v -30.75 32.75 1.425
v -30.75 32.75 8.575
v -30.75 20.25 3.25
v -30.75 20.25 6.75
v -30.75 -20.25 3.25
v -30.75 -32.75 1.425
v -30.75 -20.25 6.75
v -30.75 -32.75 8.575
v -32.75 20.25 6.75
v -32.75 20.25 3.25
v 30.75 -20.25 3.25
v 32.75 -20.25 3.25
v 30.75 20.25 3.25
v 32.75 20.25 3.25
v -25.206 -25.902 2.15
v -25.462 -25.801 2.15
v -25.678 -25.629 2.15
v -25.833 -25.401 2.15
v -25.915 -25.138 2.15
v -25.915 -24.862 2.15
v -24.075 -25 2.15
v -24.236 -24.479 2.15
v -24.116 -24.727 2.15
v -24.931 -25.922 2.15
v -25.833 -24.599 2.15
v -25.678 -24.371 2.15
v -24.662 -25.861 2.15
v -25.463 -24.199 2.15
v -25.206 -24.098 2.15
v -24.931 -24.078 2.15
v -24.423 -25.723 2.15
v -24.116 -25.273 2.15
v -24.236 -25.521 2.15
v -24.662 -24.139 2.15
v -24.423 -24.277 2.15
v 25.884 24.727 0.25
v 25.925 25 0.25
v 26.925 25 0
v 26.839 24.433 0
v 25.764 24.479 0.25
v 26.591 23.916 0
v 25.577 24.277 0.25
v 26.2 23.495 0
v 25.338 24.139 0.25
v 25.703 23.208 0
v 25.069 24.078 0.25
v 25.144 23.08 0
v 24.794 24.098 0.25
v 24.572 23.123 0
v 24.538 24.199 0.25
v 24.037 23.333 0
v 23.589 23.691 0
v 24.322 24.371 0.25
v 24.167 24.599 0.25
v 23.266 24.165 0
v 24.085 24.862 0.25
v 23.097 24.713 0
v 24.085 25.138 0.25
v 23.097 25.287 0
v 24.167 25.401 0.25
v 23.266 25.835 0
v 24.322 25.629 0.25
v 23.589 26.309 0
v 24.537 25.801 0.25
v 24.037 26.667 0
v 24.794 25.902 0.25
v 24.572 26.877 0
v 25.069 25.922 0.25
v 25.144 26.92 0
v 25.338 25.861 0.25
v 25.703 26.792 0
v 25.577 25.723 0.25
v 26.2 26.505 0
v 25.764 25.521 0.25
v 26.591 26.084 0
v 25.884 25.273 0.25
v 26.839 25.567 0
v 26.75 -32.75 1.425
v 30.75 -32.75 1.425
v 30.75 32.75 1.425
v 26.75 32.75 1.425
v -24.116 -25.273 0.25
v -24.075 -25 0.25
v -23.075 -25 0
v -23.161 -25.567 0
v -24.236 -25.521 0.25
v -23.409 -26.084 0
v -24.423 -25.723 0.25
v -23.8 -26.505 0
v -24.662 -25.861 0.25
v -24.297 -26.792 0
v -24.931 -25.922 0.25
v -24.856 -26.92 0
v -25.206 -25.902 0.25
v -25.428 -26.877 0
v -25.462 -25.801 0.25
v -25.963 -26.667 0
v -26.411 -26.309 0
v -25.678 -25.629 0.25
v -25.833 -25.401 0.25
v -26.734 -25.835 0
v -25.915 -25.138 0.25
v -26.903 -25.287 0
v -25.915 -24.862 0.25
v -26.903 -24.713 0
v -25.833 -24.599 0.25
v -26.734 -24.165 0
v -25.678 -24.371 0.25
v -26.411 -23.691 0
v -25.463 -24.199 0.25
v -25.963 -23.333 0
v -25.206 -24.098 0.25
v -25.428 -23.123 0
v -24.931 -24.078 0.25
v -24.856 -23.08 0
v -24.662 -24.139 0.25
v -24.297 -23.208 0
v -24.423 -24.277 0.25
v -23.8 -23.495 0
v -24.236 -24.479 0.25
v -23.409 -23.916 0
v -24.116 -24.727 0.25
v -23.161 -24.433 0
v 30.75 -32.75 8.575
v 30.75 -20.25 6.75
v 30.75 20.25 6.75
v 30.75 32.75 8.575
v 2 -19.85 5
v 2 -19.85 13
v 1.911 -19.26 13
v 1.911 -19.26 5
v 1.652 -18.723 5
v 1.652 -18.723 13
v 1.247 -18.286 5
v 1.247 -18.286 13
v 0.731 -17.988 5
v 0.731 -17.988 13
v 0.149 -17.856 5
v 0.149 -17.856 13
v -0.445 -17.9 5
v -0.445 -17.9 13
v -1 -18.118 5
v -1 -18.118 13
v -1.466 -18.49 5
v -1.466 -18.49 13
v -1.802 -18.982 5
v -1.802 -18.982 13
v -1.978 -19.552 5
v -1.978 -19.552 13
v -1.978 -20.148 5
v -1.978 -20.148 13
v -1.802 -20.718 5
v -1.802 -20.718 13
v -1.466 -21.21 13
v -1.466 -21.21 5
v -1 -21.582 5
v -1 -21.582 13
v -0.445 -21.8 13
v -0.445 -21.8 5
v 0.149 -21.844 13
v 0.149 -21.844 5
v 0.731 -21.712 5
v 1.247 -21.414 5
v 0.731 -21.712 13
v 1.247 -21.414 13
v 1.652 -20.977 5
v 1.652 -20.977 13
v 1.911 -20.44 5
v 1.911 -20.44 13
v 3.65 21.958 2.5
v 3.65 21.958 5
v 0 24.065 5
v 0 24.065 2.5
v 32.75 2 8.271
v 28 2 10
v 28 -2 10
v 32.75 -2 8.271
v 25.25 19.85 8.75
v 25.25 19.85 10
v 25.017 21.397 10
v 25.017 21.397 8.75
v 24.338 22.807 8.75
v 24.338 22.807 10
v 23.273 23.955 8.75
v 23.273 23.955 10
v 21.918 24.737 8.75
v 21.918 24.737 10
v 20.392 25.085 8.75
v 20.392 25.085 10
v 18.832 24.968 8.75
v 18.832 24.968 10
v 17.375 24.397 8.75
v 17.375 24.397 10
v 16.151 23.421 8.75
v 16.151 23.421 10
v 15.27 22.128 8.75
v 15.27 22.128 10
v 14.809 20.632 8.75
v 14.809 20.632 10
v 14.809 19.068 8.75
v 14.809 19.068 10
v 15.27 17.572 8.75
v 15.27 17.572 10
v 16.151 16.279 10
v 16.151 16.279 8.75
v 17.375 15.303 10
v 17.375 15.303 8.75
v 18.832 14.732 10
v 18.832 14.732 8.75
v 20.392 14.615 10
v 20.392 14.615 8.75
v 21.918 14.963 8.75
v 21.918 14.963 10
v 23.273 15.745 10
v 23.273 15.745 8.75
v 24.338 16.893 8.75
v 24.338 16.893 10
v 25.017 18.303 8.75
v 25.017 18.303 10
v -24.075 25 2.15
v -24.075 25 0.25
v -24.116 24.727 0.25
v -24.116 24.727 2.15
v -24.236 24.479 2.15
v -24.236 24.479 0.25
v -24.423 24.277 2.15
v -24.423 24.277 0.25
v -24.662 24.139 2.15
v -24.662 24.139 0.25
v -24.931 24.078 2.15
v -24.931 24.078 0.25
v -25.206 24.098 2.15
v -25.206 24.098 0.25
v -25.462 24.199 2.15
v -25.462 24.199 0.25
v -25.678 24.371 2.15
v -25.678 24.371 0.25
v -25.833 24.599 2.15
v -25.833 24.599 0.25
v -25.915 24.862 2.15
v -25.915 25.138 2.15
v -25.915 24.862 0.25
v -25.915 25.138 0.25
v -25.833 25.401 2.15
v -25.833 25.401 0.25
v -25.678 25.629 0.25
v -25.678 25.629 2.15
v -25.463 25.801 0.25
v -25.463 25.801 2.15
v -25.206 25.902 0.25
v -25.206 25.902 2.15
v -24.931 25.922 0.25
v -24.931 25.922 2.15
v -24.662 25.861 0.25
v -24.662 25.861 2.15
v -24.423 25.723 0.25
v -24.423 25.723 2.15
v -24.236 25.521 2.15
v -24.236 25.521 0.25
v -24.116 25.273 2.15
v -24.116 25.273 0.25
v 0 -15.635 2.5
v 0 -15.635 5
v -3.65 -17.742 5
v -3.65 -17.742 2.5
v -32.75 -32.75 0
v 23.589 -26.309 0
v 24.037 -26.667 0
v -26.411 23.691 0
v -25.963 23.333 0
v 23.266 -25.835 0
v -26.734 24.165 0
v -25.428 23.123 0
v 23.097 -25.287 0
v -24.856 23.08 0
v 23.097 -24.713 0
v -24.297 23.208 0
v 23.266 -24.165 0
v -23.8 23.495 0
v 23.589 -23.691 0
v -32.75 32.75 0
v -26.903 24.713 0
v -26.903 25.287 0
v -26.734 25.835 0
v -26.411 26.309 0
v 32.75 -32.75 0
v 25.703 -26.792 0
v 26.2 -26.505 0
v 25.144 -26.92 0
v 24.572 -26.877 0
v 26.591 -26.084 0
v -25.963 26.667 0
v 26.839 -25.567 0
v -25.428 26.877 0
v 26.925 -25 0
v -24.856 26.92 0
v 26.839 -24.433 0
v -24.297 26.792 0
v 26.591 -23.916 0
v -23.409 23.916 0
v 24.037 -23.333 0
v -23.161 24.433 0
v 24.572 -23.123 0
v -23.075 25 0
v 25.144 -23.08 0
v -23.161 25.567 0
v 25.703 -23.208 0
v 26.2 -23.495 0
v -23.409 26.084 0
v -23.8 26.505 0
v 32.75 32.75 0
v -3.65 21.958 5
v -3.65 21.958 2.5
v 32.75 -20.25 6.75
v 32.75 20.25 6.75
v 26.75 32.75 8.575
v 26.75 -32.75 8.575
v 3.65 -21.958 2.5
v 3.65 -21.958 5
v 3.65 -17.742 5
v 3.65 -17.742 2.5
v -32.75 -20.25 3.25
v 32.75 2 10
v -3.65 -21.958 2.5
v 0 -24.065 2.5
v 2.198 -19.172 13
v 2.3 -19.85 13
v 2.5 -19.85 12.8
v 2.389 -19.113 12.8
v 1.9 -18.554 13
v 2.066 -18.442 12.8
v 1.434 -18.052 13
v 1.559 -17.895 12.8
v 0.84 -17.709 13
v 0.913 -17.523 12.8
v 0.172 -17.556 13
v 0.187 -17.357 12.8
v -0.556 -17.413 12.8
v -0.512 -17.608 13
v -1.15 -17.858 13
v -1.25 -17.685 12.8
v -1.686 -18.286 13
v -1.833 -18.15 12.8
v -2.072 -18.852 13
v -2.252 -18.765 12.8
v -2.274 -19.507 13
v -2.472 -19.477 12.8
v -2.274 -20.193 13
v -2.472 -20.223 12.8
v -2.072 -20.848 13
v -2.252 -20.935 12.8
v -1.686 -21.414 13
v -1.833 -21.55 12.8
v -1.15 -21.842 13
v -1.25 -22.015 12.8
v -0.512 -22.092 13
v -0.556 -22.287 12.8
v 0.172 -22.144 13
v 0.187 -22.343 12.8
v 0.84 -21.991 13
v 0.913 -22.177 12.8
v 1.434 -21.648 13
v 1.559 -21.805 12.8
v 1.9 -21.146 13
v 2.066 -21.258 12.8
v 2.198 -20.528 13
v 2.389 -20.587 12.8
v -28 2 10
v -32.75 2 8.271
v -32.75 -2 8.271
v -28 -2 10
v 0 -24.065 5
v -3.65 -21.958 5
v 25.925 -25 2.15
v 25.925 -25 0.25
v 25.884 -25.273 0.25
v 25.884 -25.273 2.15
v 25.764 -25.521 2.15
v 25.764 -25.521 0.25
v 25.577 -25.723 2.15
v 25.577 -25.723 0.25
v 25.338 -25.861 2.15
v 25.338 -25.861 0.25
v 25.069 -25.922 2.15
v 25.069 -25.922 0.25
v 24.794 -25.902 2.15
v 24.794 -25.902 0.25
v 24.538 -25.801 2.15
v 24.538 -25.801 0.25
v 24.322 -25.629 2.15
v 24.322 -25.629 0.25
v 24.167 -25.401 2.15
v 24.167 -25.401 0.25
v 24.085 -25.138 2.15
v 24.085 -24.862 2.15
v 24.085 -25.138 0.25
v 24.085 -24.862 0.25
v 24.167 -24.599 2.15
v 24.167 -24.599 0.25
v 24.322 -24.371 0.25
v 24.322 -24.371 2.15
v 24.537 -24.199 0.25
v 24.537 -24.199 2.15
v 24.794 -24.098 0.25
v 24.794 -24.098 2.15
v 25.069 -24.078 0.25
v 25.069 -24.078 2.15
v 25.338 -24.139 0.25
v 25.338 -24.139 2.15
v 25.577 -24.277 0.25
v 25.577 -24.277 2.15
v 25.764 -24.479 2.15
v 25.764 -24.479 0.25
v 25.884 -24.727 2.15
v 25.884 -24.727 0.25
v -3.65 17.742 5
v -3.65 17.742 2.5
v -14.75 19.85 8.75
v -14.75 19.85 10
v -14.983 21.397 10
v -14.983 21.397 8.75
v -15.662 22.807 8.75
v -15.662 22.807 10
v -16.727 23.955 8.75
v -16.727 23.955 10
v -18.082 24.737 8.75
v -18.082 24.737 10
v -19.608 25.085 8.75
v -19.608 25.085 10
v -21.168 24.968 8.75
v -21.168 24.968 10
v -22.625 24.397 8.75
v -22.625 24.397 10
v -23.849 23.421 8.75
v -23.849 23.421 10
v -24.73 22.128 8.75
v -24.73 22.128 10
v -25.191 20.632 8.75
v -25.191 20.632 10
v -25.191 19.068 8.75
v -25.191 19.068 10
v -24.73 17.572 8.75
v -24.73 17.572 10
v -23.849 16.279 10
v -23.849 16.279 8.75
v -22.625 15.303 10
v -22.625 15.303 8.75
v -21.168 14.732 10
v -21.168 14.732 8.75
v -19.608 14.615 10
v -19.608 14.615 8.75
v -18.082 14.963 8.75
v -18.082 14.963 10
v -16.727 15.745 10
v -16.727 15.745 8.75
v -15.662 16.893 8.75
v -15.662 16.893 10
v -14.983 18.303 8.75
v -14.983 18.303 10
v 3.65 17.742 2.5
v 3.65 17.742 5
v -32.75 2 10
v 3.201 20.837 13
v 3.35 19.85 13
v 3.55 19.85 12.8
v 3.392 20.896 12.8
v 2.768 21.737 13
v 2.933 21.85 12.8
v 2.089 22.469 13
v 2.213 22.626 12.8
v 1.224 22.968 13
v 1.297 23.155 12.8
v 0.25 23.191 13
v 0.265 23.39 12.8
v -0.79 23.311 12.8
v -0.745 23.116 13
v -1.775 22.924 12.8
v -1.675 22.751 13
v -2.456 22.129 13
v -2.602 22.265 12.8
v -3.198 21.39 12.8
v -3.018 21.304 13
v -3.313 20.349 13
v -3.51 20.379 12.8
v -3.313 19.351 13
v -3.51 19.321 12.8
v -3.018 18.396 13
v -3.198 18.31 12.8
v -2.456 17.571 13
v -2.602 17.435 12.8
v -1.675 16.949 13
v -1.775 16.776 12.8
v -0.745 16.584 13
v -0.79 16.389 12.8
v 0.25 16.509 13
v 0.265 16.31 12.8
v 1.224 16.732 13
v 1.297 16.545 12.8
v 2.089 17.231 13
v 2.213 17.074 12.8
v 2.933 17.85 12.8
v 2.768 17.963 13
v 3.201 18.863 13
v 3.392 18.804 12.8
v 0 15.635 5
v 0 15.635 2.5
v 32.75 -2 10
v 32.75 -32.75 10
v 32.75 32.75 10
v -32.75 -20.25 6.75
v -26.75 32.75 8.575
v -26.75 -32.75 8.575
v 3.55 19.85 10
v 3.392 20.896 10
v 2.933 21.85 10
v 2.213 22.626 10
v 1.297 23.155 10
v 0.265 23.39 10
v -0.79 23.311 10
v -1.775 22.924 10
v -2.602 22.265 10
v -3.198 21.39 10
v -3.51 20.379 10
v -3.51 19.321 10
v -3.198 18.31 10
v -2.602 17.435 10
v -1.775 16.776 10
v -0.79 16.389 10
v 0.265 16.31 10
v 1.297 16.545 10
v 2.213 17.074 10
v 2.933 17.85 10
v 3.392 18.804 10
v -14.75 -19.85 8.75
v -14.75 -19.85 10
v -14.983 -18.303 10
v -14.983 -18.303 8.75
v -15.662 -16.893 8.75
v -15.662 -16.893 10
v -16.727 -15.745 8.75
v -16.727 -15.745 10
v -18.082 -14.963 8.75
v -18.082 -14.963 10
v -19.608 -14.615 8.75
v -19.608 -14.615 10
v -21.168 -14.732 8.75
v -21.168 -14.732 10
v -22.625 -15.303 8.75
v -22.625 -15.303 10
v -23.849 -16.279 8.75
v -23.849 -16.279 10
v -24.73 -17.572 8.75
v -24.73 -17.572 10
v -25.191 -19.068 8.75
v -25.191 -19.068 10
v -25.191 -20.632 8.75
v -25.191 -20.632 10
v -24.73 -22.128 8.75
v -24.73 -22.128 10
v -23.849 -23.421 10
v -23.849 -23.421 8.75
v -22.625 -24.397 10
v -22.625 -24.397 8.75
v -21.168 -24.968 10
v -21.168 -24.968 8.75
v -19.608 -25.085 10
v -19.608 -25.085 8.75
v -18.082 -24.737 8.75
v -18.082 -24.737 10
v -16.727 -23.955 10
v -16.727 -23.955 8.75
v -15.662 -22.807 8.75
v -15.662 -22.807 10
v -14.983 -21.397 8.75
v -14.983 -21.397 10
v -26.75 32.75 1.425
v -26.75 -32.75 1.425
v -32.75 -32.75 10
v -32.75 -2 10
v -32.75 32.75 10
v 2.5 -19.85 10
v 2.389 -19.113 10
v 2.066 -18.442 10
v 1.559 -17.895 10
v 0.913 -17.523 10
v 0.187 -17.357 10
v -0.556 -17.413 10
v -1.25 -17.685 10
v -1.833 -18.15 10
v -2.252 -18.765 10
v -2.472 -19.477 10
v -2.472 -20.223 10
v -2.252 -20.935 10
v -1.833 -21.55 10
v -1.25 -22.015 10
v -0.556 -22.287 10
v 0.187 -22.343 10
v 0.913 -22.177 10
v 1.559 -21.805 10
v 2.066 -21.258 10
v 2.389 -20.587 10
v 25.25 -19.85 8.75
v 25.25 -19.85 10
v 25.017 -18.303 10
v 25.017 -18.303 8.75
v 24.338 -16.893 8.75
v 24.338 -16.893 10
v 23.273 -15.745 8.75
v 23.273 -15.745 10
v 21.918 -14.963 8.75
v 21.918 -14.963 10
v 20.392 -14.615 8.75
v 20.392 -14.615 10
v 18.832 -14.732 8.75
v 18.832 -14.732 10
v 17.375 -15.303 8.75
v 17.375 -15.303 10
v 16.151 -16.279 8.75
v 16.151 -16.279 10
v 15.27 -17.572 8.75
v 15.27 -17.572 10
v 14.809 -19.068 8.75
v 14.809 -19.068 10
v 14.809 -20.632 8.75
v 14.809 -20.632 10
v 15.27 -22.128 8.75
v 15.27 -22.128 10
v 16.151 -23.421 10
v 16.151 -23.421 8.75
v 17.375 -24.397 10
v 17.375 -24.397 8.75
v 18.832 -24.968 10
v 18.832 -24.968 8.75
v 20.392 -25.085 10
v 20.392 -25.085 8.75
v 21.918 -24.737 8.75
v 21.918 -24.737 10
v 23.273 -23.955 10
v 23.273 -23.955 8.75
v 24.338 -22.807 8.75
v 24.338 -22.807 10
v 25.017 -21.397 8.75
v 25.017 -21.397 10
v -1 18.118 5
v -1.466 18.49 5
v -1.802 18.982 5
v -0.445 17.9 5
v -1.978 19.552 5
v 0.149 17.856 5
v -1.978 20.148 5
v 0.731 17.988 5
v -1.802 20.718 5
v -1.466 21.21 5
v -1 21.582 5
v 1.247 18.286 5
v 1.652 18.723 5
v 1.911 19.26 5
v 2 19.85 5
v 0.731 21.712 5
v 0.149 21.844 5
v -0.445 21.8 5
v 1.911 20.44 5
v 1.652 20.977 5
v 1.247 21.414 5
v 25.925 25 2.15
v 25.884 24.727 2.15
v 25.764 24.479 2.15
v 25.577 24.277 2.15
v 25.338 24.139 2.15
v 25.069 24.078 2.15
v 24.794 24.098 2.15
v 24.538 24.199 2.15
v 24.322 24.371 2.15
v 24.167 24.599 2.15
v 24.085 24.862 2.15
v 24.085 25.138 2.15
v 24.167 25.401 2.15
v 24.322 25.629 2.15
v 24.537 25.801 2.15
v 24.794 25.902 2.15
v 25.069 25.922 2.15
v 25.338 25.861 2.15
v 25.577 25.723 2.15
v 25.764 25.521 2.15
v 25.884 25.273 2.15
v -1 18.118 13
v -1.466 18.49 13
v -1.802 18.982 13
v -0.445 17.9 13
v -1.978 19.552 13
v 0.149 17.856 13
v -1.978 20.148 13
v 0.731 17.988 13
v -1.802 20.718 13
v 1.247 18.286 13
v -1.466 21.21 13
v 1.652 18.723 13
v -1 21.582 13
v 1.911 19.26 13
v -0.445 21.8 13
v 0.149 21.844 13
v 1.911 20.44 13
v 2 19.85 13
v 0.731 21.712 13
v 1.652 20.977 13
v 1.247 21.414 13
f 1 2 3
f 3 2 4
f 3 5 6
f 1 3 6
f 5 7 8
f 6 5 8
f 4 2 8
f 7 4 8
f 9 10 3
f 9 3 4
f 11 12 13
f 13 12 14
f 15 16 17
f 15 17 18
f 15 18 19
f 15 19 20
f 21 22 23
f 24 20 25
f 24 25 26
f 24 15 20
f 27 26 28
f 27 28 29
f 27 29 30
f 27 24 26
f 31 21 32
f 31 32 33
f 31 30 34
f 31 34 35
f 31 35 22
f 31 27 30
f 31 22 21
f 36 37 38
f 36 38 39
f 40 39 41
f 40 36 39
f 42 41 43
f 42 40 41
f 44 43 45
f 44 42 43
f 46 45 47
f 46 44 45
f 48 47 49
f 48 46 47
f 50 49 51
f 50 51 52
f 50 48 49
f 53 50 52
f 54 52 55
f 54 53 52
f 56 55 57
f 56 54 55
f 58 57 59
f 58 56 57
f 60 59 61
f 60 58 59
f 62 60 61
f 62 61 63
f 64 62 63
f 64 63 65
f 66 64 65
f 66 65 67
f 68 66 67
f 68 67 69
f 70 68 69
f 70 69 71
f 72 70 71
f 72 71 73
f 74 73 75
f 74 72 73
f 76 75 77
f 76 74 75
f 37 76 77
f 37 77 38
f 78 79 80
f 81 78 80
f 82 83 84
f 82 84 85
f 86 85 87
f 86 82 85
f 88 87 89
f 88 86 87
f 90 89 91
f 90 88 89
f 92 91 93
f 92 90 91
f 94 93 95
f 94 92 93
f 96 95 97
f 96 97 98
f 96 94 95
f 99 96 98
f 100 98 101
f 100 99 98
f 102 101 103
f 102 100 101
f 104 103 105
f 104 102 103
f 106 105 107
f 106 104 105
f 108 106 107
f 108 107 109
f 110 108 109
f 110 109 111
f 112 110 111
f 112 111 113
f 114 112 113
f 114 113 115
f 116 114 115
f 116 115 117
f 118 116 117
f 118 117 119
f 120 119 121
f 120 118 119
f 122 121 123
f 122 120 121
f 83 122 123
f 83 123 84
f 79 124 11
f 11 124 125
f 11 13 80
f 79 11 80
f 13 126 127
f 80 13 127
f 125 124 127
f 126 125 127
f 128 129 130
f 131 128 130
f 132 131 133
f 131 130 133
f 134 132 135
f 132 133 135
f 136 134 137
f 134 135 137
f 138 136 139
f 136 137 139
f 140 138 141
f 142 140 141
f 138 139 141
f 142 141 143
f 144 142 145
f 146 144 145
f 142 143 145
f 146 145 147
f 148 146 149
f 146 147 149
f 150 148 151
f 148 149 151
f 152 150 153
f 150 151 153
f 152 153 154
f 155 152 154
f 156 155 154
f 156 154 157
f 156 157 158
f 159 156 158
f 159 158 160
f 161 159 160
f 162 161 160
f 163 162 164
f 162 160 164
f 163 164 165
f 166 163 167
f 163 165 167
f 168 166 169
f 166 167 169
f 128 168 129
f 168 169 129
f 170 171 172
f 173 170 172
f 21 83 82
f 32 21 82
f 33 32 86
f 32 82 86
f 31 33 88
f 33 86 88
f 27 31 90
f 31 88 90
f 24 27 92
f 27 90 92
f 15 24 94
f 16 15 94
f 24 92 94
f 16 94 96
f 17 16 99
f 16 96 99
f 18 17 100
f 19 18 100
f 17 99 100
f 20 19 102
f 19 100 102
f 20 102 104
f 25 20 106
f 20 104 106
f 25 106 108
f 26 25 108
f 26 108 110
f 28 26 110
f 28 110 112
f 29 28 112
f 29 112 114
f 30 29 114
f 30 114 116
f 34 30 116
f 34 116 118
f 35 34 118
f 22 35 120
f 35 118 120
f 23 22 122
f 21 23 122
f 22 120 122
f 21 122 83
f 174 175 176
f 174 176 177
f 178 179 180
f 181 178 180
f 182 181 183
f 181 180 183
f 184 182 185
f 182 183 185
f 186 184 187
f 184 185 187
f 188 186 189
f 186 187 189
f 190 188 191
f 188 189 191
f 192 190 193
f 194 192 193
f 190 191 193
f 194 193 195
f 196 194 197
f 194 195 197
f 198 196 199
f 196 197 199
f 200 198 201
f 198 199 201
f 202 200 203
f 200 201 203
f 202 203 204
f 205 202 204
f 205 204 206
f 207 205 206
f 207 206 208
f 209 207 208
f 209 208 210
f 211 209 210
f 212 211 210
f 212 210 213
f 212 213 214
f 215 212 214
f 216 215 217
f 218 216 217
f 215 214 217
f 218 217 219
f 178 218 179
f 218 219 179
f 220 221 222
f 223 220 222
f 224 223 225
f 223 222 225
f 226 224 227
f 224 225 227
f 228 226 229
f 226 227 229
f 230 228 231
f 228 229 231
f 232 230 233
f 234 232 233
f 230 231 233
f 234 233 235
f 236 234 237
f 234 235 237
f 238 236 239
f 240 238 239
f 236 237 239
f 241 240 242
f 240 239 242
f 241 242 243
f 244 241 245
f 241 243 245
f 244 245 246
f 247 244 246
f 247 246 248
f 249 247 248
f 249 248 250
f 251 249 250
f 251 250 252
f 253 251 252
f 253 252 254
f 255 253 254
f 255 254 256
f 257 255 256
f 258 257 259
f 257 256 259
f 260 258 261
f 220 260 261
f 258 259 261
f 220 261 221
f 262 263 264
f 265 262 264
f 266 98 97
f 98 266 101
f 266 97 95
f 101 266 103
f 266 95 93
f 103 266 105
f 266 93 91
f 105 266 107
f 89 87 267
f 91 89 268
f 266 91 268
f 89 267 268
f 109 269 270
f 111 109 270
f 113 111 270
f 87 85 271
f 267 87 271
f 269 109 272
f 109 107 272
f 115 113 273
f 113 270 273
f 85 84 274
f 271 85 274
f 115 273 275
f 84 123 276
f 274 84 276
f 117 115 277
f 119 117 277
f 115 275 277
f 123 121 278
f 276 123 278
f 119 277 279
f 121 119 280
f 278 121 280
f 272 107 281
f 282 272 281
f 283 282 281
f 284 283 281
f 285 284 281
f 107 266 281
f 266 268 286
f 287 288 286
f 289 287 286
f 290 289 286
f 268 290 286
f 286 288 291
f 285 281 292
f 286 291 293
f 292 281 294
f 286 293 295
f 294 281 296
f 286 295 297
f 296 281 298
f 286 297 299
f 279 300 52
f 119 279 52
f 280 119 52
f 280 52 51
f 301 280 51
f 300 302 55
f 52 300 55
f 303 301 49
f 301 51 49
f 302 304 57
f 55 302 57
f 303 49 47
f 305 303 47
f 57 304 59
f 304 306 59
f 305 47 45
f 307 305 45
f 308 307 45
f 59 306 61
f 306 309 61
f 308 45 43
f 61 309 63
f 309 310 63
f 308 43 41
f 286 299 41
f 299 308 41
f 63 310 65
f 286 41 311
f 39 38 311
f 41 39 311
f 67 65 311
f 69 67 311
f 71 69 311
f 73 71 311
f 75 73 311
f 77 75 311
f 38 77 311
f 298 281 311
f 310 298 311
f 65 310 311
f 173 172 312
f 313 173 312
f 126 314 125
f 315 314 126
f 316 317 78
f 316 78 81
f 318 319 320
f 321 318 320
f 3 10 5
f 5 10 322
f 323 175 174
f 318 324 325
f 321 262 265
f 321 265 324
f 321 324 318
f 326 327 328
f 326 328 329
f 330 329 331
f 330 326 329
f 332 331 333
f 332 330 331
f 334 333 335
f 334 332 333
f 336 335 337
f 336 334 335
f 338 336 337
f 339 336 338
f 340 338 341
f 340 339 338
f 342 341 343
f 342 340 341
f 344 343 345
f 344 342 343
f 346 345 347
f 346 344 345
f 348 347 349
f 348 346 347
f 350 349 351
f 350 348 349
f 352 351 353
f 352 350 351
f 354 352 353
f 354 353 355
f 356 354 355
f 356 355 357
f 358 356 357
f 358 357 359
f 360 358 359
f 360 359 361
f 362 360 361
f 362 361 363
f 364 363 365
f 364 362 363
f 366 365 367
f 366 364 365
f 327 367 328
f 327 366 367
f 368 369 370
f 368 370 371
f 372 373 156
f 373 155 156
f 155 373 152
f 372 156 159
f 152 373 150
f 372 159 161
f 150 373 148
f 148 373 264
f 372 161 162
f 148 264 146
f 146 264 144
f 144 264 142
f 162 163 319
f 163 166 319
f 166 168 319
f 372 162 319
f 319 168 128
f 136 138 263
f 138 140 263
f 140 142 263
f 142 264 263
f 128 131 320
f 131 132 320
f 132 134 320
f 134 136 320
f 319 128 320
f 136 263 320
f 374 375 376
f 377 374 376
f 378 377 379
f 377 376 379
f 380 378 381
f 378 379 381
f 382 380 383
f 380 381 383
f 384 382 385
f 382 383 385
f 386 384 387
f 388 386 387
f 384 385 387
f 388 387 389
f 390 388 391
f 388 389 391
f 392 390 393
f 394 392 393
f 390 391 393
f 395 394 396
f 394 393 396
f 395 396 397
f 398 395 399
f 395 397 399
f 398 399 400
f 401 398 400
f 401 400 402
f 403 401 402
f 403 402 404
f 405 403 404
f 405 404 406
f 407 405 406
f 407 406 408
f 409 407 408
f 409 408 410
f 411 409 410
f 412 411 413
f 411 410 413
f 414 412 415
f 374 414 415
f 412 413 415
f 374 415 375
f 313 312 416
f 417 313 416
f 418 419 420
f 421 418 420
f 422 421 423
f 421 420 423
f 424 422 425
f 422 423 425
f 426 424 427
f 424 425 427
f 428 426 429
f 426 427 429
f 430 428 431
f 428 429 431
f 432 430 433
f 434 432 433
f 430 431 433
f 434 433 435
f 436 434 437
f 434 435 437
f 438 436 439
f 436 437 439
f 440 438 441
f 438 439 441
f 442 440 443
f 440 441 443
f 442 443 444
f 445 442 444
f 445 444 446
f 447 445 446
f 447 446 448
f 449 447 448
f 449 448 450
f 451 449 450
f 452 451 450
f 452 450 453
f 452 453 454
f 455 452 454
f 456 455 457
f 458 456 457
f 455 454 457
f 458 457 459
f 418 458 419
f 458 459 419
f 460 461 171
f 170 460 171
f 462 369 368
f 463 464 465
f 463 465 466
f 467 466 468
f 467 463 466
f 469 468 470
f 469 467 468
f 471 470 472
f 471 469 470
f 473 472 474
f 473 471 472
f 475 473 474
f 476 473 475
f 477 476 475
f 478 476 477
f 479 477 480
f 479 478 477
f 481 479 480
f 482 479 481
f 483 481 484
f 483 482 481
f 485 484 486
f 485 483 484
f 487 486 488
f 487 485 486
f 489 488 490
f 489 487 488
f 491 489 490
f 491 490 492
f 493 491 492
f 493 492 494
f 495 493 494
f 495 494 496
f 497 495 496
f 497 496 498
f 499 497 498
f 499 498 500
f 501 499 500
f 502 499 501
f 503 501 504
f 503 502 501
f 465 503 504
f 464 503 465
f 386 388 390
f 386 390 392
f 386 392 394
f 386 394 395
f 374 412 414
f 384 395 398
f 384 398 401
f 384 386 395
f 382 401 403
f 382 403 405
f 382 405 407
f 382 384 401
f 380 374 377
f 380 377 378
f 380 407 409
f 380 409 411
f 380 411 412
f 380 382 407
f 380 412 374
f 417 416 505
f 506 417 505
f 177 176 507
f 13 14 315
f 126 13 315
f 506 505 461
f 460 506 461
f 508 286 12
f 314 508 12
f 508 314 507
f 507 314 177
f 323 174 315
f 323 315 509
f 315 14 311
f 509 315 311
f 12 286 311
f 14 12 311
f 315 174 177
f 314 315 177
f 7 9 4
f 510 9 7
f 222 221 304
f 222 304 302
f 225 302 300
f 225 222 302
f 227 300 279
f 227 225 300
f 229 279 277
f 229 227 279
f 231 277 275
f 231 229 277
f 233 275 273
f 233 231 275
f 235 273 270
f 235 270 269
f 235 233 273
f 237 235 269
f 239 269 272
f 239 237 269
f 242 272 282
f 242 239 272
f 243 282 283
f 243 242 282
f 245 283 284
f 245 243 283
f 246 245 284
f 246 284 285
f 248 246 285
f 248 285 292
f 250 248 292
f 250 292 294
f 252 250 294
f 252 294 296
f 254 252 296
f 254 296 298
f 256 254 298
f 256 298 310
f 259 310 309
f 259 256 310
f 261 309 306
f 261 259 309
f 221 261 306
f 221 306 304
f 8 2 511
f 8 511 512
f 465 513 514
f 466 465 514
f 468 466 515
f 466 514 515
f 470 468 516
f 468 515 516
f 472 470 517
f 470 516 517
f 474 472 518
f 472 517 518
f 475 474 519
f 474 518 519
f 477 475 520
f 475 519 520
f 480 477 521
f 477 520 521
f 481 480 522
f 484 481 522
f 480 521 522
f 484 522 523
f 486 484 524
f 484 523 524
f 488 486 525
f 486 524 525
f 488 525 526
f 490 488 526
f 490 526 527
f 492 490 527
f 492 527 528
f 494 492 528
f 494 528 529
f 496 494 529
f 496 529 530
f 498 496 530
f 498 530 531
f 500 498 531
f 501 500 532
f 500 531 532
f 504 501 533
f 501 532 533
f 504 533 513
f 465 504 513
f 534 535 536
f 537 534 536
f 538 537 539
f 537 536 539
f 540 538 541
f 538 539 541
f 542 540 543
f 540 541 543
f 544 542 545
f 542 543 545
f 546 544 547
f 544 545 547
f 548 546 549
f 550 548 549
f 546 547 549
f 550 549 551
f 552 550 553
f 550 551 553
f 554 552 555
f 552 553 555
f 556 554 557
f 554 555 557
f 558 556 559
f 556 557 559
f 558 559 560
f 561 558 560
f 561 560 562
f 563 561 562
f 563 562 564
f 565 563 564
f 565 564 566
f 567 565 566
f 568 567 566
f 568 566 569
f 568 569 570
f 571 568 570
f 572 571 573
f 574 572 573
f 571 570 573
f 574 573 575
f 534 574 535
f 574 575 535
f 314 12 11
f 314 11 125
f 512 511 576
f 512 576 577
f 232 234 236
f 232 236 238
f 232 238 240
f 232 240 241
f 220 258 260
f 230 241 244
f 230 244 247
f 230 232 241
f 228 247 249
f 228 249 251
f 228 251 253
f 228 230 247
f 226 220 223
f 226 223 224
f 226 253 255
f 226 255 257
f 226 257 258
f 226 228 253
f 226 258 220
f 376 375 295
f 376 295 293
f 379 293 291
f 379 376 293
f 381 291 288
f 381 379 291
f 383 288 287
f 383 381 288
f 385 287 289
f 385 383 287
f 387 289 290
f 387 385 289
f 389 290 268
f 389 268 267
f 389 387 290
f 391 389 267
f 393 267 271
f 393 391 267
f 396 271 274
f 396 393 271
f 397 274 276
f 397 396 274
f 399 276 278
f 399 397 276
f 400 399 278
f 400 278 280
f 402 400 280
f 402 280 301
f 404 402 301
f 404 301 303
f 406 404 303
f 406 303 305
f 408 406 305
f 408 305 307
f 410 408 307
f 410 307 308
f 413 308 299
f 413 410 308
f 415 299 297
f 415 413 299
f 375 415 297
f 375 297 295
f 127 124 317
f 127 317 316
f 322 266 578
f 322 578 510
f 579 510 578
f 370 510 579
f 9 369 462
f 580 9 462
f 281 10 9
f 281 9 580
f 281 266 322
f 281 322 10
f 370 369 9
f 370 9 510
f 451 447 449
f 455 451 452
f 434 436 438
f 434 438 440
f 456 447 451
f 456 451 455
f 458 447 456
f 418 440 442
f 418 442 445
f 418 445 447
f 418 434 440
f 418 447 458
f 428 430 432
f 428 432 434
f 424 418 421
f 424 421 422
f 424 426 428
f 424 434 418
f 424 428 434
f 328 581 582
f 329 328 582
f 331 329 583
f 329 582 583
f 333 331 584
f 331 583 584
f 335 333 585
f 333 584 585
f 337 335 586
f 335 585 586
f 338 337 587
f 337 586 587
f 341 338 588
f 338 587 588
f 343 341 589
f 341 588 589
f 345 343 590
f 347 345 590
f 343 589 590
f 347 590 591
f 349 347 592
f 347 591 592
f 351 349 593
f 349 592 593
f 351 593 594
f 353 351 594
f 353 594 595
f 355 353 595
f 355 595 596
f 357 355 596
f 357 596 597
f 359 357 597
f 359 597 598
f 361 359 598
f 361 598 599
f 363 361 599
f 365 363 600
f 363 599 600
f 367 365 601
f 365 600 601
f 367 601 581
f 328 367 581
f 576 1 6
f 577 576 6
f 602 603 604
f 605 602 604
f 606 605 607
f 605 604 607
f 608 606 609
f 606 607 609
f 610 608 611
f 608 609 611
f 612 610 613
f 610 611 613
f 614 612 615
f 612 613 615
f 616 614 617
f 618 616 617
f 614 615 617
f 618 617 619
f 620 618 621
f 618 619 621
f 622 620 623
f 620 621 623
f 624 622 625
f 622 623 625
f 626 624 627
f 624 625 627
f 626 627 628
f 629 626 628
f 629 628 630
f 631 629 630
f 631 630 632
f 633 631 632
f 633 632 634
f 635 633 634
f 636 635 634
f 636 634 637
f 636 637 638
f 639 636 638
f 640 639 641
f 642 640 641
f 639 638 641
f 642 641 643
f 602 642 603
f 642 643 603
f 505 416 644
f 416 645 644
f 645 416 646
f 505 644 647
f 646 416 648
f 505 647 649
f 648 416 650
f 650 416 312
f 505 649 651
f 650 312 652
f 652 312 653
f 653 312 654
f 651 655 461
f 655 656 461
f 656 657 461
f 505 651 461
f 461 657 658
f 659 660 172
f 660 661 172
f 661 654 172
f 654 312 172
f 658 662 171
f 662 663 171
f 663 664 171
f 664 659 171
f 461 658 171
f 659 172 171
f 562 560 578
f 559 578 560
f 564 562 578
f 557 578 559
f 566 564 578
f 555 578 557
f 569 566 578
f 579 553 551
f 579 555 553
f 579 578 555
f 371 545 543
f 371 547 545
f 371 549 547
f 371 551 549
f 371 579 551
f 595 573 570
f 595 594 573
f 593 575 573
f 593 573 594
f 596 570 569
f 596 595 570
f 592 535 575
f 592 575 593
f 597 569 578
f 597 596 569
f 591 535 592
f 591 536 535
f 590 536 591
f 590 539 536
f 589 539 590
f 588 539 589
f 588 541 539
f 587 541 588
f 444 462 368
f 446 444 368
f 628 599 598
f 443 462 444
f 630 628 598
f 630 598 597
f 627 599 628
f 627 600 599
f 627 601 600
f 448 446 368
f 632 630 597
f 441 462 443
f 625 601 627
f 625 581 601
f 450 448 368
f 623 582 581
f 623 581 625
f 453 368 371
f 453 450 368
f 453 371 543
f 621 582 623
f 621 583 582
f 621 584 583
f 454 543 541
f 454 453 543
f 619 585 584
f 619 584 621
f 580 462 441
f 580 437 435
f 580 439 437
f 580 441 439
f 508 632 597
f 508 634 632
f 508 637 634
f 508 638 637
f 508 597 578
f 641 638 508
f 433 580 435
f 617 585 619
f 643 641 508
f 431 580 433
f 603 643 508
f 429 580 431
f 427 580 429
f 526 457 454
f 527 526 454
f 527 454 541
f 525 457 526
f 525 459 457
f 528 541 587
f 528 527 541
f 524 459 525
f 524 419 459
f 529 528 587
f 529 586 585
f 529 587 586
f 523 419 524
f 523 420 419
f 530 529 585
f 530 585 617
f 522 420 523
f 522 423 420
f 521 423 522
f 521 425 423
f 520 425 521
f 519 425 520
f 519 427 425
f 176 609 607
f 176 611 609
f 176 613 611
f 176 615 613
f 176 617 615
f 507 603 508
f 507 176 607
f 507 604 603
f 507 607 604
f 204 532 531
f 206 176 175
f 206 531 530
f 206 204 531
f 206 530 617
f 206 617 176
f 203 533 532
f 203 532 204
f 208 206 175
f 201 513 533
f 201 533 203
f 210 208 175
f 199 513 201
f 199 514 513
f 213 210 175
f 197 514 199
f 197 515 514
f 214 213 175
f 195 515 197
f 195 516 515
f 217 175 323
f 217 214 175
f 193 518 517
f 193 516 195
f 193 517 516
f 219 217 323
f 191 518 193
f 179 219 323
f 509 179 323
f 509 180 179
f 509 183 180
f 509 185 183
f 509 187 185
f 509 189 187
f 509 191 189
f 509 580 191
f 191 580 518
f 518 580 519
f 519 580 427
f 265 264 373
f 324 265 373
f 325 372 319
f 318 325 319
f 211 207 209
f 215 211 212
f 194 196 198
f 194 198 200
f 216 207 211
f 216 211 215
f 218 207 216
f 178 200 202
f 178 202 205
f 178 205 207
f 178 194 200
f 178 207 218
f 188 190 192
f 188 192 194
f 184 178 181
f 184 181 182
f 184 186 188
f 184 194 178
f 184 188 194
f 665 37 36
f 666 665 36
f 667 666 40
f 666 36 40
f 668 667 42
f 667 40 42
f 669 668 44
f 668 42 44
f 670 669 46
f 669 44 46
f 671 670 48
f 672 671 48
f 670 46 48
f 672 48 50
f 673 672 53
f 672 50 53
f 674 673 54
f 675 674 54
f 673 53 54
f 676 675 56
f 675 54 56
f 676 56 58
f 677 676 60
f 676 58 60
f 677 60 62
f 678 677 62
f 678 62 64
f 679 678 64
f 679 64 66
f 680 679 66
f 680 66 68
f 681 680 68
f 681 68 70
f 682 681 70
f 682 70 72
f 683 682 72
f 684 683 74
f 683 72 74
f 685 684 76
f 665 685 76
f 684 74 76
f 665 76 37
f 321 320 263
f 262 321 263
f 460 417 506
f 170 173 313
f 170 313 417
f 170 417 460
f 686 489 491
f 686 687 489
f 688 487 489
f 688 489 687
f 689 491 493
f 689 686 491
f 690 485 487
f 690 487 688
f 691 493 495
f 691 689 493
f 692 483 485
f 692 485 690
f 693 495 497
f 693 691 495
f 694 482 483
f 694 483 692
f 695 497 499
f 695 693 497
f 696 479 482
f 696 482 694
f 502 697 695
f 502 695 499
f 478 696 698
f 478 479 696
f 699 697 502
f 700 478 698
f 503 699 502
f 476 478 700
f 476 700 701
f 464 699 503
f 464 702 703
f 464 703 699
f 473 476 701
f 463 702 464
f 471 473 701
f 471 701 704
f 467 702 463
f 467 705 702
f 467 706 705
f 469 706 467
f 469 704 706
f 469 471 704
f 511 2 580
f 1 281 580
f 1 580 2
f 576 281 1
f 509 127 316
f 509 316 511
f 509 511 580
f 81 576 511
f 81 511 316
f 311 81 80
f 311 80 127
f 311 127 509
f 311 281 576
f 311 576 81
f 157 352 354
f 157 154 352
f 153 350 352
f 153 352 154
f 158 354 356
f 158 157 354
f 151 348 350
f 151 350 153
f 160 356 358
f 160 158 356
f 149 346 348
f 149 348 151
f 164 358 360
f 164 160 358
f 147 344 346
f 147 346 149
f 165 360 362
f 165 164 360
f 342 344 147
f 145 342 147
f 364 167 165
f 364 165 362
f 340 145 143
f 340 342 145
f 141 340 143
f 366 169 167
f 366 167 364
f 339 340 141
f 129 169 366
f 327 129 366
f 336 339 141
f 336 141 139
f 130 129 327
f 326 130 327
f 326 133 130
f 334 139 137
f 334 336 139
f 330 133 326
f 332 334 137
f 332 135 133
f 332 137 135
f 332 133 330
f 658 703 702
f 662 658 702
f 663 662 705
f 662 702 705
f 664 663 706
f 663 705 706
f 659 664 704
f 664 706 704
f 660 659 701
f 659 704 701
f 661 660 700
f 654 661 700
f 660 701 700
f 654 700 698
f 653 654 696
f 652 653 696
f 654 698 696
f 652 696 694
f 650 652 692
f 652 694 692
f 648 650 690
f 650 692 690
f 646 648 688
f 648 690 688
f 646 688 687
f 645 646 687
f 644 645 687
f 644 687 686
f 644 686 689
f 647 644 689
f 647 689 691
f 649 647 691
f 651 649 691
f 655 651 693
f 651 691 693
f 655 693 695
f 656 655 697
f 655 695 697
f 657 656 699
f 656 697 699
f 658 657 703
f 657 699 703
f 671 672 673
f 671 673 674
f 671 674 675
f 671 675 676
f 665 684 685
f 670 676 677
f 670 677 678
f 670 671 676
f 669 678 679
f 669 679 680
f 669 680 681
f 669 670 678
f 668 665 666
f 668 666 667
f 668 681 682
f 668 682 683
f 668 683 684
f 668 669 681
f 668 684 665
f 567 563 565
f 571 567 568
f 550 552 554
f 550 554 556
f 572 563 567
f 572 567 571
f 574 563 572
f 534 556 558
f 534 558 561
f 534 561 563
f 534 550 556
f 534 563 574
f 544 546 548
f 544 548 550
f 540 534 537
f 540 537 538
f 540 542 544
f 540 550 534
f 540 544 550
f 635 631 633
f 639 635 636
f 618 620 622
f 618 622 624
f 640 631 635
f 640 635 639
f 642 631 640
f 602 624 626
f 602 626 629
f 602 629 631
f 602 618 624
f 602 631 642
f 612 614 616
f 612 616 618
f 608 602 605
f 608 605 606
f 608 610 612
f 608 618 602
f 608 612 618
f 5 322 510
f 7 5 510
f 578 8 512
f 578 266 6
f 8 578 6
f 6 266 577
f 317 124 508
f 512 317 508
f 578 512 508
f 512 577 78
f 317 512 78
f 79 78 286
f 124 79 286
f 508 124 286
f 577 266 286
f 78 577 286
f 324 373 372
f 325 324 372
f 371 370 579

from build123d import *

# Parameters (mm, degrees)
SKETCH_W         = 65.5
SKETCH_H         = 65.5
PAD_DEPTH        = 10
SKETCH001_R      = 3.55
SKETCH001_R_2    = 2.5
PAD001_DEPTH     = 3
SKETCH002_R      = 2
POCKET_DEPTH     = 8
CHAMFER_SIZE     = 0.2
POCKET001_DEPTH  = 2.5
SKETCH004_W      = 40.5
SKETCH004_H      = 3.5
POCKET002_DEPTH  = 2
SKETCH005_W      = 40.5
SKETCH005_H      = 3.5
POCKET003_DEPTH  = 2
SKETCH006_W      = 65.5
SKETCH006_H      = 7.15
POCKET004_DEPTH  = 4
SKETCH007_W      = 65.5
SKETCH007_H      = 7.15
POCKET005_DEPTH  = 4
SKETCH008_R      = 0.925
POCKET006_DEPTH  = 2.15
CHAMFER001_SIZE2 = 0.25
CHAMFER001_SIZE  = 1
SKETCH009_R      = 5.25
POCKET007_DEPTH  = 1.25
SKETCH010_W      = 8.92708
SKETCH010_H      = 4
POCKET008_DEPTH  = 4
SKETCH011_W      = 8.92708
SKETCH011_H      = 4
POCKET009_DEPTH  = 5


with BuildPart() as part:
    # Sketch → Pad (new body)
    with BuildSketch(Plane.XY):
        Rectangle(SKETCH_W, SKETCH_H)
    extrude(amount=PAD_DEPTH)

    # Sketch001 (on Face6 of Pad) → Pad001 (join)
    with BuildSketch(Plane.XY.offset(10)):
        with Locations((0, 19.85)):
            Circle(SKETCH001_R)
        with Locations((0, -19.85)):
            Circle(SKETCH001_R_2)
    extrude(amount=PAD001_DEPTH)

    # Sketch002 (on Face10 of Pad001) → Pocket (cut)
    with BuildSketch(Plane.XY.offset(13)):
        with Locations((0, 19.85)):
            Circle(SKETCH002_R)
        with Locations((0, -19.85)):
            Circle(SKETCH002_R)
    extrude(amount=-POCKET_DEPTH, mode=Mode.SUBTRACT)

    # Chamfer
    chamfer_edges = [part.edges().sort_by_distance(p)[0] for p in [
        (-3.55, 19.85, 13),
        (-2.5, -19.85, 13),
    ]]
    chamfer(chamfer_edges, length=CHAMFER_SIZE)

    # Sketch003 (on DatumPlane) → Pocket001 (cut)
    with BuildSketch(Plane.XY.offset(5)):
        Polygon((-3.650297, 17.7425), (0, 15.635), (3.650297, 17.7425), (3.650297, 21.9575), (0, 24.065), (-3.650297, 21.9575), align=None)
        Polygon((-3.650297, -21.9575), (0, -24.065), (3.650297, -21.9575), (3.650297, -17.7425), (0, -15.635), (-3.650297, -17.7425), align=None)
    extrude(amount=-POCKET001_DEPTH, mode=Mode.SUBTRACT)

    # Sketch004 (on Face7 of Pocket001) → Pocket002 (cut)
    with BuildSketch(Plane.YZ.offset(32.75)):
        with Locations((0, 5)):
            Rectangle(SKETCH004_W, SKETCH004_H)
    extrude(amount=-POCKET002_DEPTH, mode=Mode.SUBTRACT)

    # Sketch005 (on Face6 of Pocket002) → Pocket003 (cut)
    with BuildSketch(Plane(origin=(-32.75, 0, 0), x_dir=(0, -1, 0), z_dir=(-1, 0, 0))):
        with Locations((0, 5)):
            Rectangle(SKETCH005_W, SKETCH005_H)
    extrude(amount=-POCKET003_DEPTH, mode=Mode.SUBTRACT)

    # Sketch006 (on DatumPlane) → Pocket004 (cut)
    with BuildSketch(Plane.YZ.offset(30.75)):
        with Locations((0, 5)):
            Rectangle(SKETCH006_W, SKETCH006_H)
    extrude(amount=-POCKET004_DEPTH, mode=Mode.SUBTRACT)

    # Sketch007 (on DatumPlane) → Pocket005 (cut)
    with BuildSketch(Plane(origin=(-30.75, 0, 0), x_dir=(0, -1, 0), z_dir=(-1, 0, 0))):
        with Locations((0, 5)):
            Rectangle(SKETCH007_W, SKETCH007_H)
    extrude(amount=-POCKET005_DEPTH, mode=Mode.SUBTRACT)

    # Sketch008 (on Face11 of Pocket005) → Pocket006 (cut)
    with BuildSketch(Plane(origin=(0, 0, 0), x_dir=(1, 0, 0), z_dir=(0, 0, -1))):
        with Locations((-25, 25)):
            Circle(SKETCH008_R)
        with Locations((25, 25)):
            Circle(SKETCH008_R)
        with Locations((-25, -25)):
            Circle(SKETCH008_R)
        with Locations((25, -25)):
            Circle(SKETCH008_R)
    extrude(amount=-POCKET006_DEPTH, mode=Mode.SUBTRACT)

    # Chamfer001
    chamfer001_edges = [part.edges().sort_by_distance(p)[0] for p in [
        (-25.925, -25, 0),
        (24.075, -25, 0),
        (-25.925, 25, 0),
        (24.075, 25, 0),
    ]]
    chamfer001_side = part.faces().sort_by_distance((0, 0, 0))[0]
    chamfer(chamfer001_edges, length=CHAMFER001_SIZE, length2=CHAMFER001_SIZE2, reference=chamfer001_side)

    # Sketch009 (on Face11 of Chamfer001) → Pocket007 (cut)
    with BuildSketch(Plane.XY.offset(10)):
        with Locations((-20, 19.85)):
            Circle(SKETCH009_R)
        with Locations((20, 19.85)):
            Circle(SKETCH009_R)
        with Locations((20, -19.85)):
            Circle(SKETCH009_R)
        with Locations((-20, -19.85)):
            Circle(SKETCH009_R)
    extrude(amount=-POCKET007_DEPTH, mode=Mode.SUBTRACT)

    # Sketch010 (on DatumPlane) → Pocket008 (cut)
    with BuildSketch(Plane(origin=(28, 0, 10), x_dir=(0.939693, 0, -0.34202), z_dir=(0.34202, 0, 0.939693))):
        with Locations((4.46354, 0)):
            Rectangle(SKETCH010_W, SKETCH010_H)
    extrude(amount=POCKET008_DEPTH, mode=Mode.SUBTRACT)

    # Sketch011 (on DatumPlane) → Pocket009 (cut)
    with BuildSketch(Plane(origin=(-28, 0, 10), x_dir=(0.939693, 0, 0.34202), z_dir=(-0.34202, 0, 0.939693))):
        with Locations((-4.46354, 0)):
            Rectangle(SKETCH011_W, SKETCH011_H)
    extrude(amount=POCKET009_DEPTH, mode=Mode.SUBTRACT)


solid = part.part
